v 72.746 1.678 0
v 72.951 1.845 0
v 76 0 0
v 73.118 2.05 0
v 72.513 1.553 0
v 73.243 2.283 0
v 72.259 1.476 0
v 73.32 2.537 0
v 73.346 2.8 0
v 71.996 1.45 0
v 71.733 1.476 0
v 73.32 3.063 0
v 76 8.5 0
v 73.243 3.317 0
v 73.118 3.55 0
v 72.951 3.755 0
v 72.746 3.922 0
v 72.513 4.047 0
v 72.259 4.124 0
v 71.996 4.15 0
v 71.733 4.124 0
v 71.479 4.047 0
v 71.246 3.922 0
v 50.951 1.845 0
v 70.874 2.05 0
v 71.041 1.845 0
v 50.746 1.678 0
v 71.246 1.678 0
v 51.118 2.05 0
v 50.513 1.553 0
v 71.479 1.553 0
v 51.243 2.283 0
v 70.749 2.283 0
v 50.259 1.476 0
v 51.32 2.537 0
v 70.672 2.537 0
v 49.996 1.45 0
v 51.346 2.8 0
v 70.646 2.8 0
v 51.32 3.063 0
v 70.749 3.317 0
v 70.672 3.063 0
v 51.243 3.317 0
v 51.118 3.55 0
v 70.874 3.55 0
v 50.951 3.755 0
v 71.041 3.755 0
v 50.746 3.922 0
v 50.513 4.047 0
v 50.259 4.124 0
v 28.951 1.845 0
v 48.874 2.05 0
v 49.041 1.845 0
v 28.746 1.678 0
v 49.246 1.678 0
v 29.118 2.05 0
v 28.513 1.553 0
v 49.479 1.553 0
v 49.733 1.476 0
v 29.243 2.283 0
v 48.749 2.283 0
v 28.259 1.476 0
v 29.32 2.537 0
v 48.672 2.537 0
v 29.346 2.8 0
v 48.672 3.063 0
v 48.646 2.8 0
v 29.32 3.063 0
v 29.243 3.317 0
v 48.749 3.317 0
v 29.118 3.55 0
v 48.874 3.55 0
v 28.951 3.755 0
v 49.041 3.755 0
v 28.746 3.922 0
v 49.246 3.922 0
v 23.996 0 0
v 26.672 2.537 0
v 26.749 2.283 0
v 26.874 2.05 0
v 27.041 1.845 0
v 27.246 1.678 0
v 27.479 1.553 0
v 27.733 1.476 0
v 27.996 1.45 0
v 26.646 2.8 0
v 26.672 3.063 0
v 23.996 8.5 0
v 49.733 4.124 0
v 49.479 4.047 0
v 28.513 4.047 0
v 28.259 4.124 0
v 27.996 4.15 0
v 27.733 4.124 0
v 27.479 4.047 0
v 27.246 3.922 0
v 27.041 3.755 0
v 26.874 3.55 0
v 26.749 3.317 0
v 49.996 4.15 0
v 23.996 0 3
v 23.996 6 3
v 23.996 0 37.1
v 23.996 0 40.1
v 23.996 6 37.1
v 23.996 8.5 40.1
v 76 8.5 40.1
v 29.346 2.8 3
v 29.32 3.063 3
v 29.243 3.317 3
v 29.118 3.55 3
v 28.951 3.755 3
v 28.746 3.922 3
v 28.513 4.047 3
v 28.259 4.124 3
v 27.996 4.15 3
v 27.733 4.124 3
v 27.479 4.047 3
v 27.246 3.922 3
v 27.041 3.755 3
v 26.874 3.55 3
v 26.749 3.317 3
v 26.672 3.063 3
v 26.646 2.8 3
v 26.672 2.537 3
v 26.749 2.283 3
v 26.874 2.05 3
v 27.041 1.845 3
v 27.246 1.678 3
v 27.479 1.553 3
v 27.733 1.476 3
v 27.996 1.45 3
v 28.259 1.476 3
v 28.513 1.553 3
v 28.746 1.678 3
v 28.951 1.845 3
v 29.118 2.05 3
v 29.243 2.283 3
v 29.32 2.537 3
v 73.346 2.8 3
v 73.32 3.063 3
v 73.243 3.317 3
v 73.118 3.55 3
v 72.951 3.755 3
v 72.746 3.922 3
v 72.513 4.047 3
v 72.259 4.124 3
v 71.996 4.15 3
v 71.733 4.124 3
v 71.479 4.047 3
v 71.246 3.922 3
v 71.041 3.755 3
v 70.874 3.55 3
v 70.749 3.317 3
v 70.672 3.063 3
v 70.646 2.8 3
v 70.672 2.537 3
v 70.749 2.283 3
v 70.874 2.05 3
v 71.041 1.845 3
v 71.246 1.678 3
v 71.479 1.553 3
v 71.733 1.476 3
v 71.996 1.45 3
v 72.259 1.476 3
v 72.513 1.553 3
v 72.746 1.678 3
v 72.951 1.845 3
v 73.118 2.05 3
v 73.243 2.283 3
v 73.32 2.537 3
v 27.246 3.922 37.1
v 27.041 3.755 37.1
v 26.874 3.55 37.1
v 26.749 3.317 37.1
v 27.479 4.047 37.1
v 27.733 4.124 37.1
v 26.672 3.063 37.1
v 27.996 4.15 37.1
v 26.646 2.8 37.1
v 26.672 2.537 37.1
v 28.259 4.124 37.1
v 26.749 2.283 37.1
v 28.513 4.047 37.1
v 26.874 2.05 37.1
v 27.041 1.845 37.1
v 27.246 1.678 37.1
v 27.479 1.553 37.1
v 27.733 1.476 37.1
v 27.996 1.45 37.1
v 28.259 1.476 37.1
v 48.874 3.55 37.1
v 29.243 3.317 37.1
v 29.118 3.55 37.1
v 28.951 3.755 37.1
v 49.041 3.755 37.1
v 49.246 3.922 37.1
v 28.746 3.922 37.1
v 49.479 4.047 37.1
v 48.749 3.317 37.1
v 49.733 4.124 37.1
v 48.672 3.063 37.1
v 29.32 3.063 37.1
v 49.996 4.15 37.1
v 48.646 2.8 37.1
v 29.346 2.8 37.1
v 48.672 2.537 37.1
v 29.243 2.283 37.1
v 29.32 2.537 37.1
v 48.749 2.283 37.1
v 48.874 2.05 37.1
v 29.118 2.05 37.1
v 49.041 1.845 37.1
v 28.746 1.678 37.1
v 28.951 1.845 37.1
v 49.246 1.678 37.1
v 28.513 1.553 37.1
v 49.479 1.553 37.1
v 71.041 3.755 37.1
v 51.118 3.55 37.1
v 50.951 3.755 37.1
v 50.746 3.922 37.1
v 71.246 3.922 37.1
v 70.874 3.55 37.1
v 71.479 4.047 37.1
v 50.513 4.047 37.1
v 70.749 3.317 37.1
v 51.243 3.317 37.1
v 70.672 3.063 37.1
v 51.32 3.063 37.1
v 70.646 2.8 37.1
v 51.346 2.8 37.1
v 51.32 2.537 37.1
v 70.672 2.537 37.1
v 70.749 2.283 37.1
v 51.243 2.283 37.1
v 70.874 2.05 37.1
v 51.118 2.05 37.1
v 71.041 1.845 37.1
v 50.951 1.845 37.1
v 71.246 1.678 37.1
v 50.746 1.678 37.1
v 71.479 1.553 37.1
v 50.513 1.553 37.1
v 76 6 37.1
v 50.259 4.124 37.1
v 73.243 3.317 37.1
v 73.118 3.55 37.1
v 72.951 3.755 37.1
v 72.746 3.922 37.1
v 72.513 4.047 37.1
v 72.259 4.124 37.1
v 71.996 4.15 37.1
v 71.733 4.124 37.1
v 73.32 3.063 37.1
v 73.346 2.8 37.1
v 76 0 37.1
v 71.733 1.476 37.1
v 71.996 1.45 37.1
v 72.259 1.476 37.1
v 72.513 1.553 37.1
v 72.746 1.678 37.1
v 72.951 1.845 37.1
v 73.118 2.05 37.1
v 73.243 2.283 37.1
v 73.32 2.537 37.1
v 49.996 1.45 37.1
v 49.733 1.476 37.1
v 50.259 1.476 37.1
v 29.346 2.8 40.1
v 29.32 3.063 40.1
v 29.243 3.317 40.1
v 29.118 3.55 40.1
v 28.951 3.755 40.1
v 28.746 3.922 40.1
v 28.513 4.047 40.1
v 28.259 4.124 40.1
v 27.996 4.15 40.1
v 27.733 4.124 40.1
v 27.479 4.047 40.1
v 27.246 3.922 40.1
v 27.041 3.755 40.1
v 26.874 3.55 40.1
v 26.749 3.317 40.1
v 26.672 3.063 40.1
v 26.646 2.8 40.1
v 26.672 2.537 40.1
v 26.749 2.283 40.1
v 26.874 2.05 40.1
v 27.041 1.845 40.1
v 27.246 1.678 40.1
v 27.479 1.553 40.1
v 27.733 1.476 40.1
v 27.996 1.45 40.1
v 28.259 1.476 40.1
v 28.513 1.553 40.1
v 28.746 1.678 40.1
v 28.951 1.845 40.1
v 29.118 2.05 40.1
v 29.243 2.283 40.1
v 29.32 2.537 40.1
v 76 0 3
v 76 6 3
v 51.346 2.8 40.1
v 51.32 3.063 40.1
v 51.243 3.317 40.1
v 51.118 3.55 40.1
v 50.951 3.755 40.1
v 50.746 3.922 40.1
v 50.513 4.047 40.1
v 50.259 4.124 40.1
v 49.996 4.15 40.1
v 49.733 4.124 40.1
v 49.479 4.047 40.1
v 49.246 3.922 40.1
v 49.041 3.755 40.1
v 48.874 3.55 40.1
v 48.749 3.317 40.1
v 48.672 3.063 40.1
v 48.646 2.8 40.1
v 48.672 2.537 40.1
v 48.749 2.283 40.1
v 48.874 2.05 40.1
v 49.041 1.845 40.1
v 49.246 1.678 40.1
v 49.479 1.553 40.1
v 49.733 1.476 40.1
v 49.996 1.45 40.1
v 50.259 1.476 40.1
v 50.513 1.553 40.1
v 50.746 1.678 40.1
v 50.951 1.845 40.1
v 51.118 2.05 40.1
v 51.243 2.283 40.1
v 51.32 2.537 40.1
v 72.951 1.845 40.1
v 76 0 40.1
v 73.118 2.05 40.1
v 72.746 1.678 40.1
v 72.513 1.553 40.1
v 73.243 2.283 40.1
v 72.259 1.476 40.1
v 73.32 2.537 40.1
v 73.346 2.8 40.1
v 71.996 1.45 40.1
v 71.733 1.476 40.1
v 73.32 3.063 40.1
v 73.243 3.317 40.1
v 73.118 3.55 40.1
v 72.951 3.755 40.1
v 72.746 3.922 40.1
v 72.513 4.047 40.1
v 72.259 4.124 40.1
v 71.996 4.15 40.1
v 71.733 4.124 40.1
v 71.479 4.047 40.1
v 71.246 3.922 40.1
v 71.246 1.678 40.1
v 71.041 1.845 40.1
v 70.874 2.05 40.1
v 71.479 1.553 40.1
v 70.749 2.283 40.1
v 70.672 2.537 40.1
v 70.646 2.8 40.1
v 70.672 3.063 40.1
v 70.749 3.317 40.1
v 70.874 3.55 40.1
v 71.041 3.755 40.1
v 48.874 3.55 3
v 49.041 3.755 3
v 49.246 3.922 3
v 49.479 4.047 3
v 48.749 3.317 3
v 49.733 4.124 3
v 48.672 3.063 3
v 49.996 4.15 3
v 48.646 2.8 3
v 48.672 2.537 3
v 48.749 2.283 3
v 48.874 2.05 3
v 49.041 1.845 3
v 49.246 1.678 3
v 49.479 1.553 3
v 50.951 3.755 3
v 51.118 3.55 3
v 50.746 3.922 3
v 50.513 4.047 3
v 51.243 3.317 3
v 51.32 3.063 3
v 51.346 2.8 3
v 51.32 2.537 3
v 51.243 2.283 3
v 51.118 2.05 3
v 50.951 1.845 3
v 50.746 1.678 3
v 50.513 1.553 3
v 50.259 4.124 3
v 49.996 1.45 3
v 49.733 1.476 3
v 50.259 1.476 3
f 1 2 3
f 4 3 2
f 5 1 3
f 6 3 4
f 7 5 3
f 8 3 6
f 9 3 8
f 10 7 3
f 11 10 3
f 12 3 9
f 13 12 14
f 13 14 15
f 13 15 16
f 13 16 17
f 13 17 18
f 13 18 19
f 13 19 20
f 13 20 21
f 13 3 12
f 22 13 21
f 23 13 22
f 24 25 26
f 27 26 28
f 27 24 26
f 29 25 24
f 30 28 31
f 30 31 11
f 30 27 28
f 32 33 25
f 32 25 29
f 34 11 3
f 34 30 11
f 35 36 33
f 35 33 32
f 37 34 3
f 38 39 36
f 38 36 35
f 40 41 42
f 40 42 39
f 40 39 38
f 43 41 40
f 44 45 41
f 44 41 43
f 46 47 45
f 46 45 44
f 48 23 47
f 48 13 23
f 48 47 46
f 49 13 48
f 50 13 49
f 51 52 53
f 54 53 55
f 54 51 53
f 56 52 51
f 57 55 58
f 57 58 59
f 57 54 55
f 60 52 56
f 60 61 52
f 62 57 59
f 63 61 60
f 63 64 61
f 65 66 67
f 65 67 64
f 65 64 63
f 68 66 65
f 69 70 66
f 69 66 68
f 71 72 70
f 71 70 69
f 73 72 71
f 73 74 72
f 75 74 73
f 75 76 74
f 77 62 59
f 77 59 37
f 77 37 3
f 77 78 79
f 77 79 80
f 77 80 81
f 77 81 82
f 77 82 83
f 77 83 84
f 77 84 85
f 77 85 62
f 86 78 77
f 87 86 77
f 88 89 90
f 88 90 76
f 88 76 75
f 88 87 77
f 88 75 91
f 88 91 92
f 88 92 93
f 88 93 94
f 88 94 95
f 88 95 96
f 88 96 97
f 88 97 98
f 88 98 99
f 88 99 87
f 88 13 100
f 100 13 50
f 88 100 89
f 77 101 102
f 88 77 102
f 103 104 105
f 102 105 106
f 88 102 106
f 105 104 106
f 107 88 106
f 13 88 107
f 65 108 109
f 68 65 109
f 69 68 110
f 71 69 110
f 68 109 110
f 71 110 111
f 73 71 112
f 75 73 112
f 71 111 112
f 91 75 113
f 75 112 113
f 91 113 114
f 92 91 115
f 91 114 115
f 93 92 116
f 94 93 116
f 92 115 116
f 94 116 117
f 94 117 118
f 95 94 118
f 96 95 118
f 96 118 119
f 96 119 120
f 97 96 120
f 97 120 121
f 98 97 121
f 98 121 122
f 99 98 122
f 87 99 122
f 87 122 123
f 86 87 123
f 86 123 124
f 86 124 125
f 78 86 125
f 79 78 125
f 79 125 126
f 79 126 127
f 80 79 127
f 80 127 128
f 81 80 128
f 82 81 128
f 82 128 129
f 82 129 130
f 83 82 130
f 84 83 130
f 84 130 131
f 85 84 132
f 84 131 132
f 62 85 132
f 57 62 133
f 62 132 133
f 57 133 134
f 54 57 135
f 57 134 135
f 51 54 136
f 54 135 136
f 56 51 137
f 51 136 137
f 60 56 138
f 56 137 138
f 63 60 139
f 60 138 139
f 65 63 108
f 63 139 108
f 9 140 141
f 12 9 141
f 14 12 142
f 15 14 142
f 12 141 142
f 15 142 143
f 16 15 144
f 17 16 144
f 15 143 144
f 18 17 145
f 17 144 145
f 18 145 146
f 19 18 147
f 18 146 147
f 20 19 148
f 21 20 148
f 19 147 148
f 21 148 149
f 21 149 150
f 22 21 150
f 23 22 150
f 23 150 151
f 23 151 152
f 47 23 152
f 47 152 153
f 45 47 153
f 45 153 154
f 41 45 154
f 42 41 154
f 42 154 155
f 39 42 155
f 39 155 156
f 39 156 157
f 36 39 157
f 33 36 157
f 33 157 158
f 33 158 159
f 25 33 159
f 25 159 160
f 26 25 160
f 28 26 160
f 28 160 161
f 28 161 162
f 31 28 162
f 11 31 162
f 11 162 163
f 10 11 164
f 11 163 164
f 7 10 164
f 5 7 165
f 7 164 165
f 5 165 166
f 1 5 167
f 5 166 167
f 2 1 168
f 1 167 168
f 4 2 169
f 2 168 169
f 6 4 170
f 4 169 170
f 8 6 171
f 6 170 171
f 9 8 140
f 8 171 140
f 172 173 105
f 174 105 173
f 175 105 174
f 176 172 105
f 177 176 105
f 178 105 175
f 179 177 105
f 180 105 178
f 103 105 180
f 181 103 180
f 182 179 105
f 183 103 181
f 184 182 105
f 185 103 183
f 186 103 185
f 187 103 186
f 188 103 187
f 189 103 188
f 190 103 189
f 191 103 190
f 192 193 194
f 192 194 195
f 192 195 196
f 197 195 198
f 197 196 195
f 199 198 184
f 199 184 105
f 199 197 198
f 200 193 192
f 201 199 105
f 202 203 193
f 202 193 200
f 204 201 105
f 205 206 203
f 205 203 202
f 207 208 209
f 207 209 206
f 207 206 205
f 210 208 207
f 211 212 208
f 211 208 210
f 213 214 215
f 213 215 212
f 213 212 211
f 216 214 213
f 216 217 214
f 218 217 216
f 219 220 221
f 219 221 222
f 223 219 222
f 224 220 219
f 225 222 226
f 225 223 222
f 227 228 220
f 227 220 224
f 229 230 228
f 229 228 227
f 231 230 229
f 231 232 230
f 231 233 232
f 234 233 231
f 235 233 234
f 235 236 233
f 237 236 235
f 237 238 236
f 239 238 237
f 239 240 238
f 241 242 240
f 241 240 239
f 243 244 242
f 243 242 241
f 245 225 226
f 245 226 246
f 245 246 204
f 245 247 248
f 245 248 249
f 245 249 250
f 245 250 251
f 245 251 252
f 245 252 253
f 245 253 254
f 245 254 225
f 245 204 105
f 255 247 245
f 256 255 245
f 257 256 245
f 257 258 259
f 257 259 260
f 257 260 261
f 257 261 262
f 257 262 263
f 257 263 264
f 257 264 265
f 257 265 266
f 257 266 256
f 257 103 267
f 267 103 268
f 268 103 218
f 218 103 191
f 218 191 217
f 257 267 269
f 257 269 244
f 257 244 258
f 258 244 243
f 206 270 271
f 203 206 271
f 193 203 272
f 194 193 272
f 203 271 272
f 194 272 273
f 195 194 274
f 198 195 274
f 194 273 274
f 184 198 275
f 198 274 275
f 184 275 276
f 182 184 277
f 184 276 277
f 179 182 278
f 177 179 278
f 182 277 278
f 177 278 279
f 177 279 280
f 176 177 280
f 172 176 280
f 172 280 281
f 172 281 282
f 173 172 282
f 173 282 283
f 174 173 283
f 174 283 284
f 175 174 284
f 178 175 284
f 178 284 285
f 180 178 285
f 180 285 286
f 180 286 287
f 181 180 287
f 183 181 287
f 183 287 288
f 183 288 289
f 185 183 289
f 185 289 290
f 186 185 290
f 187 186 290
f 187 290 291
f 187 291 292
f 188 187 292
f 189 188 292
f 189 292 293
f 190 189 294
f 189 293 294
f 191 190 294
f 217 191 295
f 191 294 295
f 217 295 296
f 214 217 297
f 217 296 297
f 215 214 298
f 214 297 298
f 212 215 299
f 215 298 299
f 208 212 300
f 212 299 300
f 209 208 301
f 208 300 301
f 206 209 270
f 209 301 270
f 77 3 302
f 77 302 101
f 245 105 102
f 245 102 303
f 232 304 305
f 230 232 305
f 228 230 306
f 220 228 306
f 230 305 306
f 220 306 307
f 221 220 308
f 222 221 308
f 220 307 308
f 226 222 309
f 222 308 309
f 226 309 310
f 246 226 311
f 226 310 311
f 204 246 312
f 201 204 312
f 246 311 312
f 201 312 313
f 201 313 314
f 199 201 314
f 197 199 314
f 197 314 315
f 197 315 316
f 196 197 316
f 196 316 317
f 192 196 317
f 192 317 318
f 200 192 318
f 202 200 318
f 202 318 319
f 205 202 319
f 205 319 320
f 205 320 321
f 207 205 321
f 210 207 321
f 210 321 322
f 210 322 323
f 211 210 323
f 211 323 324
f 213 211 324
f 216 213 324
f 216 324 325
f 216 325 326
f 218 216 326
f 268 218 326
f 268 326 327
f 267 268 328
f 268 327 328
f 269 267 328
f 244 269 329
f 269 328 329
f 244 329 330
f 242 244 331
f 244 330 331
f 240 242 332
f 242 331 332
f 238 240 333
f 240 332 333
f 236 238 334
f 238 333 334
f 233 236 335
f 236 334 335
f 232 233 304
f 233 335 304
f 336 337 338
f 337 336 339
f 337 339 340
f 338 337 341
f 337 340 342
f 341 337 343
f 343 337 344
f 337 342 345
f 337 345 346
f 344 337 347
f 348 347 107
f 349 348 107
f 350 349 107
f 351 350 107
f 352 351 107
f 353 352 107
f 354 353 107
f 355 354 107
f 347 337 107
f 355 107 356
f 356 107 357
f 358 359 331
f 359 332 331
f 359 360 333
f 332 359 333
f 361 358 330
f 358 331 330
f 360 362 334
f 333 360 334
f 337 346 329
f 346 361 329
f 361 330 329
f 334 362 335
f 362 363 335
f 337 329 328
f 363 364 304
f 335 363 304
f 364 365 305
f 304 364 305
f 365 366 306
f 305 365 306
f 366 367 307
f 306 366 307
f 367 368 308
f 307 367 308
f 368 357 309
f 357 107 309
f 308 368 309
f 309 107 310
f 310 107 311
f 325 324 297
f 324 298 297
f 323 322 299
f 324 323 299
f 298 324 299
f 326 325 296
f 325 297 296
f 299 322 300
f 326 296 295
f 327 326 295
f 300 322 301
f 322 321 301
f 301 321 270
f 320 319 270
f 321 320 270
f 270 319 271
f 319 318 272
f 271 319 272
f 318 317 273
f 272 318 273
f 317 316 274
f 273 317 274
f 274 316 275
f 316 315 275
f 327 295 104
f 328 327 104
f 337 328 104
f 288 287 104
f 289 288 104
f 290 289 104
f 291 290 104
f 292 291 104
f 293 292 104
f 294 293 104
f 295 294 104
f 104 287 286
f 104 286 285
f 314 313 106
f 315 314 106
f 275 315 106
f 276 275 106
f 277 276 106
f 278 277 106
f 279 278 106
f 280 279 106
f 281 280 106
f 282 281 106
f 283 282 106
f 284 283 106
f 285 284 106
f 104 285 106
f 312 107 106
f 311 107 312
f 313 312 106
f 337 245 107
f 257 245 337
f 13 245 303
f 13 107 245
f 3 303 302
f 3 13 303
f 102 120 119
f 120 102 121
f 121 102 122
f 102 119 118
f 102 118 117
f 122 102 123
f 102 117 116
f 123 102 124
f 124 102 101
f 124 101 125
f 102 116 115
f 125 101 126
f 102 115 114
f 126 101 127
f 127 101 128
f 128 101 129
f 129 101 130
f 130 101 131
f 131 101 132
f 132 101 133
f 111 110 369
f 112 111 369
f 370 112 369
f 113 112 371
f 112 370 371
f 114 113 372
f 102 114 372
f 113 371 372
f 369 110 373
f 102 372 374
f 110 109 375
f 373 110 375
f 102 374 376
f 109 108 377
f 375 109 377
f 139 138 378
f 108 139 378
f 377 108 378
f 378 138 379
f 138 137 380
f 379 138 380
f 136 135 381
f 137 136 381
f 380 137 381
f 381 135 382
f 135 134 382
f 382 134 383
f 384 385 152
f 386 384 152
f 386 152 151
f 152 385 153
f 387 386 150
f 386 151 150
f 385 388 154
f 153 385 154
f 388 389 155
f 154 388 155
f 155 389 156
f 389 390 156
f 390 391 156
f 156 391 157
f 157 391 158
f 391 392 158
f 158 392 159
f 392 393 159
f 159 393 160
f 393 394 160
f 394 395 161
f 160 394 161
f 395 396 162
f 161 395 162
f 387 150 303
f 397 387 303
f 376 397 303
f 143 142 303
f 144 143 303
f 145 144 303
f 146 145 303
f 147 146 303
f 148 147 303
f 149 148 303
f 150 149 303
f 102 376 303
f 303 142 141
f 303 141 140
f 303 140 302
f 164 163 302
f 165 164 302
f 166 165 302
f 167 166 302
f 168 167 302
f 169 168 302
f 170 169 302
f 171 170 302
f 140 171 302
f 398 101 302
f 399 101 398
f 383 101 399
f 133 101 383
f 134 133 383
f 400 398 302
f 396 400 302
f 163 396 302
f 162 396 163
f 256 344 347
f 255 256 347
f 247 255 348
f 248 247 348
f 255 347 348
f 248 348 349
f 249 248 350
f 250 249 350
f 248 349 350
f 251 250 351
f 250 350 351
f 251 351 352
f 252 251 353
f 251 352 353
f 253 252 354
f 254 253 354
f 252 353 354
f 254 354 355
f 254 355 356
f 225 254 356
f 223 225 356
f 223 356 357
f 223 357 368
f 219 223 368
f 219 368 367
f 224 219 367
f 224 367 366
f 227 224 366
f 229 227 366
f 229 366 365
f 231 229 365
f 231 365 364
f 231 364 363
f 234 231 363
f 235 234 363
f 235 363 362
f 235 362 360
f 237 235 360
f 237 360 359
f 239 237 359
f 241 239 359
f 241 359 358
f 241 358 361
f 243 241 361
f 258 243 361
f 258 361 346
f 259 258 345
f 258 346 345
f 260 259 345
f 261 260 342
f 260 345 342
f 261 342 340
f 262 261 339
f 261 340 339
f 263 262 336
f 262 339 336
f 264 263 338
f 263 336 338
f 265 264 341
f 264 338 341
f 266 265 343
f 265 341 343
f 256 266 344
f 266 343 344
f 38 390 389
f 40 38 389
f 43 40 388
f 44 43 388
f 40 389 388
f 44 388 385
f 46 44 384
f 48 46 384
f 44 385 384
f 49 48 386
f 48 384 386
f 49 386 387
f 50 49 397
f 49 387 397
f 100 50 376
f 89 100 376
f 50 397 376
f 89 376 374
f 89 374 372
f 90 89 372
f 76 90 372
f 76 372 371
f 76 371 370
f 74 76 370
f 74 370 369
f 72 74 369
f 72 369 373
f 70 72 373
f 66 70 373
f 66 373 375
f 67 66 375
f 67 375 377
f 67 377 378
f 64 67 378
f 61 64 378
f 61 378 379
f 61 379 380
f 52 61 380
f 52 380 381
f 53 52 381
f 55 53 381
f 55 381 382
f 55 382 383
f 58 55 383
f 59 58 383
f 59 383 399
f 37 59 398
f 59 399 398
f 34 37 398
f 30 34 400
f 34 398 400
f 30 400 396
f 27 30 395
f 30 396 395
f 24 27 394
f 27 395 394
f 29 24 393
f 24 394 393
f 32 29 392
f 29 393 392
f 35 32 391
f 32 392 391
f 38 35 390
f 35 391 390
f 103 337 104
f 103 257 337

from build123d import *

# Parameters (mm, degrees)
BOSS_EXTRUDE1_DEPTH = 40.1
SKETCH3_R           = 1.35
CUT_EXTRUDE2_DEPTH  = 50.8
SKETCH4_R           = 1.016
CUT_EXTRUDE3_DEPTH  = 50.8
SKETCH6_W           = 62.086073973
SKETCH6_H           = 34.1
CUT_EXTRUDE4_DEPTH  = 6
SKETCH17_W          = 33.483743456
SKETCH17_H          = 71.762692688
CUT_EXTRUDE5_DEPTH  = 101.73954578


with BuildPart() as part:
    # Sketch1 → Boss-Extrude1 (new body)
    with BuildSketch(Plane.XY):
        Polygon((0, 0), (0, 52.578), (6, 52.578), (6, 8.5), (76, 8.5), (76, 0), align=None)
    extrude(amount=BOSS_EXTRUDE1_DEPTH)

    # Sketch3 → Cut-Extrude2 (cut)
    with BuildSketch(Plane.XY.offset(40.1)):
        with Locations((27.996, 2.8)):
            Circle(SKETCH3_R)
        with Locations((49.996, 2.8)):
            Circle(SKETCH3_R)
        with Locations((71.996, 2.8)):
            Circle(SKETCH3_R)
    extrude(amount=-CUT_EXTRUDE2_DEPTH, mode=Mode.SUBTRACT)

    # Sketch4 → Cut-Extrude3 (cut)
    with BuildSketch(Plane.ZY):
        with Locations((27.88, 17.6)):
            Circle(SKETCH4_R)
        with Locations(Location((11.88, 17.6, 0), (0, 0, 270))):
            Circle(SKETCH4_R)
        with Locations((27.88, 49.6)):
            Circle(SKETCH4_R)
        with Locations(Location((11.88, 49.6, 0), (0, 0, 270))):
            Circle(SKETCH4_R)
    extrude(amount=-CUT_EXTRUDE3_DEPTH, mode=Mode.SUBTRACT)

    # Sketch6 → Cut-Extrude4 (cut)
    with BuildSketch(Plane.XZ):
        with Locations((50.043036987, 20.05)):
            Rectangle(SKETCH6_W, SKETCH6_H)
    extrude(amount=-CUT_EXTRUDE4_DEPTH, mode=Mode.SUBTRACT)

    # Sketch17 → Cut-Extrude5 (cut, through all)
    with BuildSketch(Plane.XY.offset(40.1)):
        with Locations((7.254128272, 35.881346344)):
            Rectangle(SKETCH17_W, SKETCH17_H)
    extrude(amount=-CUT_EXTRUDE5_DEPTH, mode=Mode.SUBTRACT)


solid = part.part
